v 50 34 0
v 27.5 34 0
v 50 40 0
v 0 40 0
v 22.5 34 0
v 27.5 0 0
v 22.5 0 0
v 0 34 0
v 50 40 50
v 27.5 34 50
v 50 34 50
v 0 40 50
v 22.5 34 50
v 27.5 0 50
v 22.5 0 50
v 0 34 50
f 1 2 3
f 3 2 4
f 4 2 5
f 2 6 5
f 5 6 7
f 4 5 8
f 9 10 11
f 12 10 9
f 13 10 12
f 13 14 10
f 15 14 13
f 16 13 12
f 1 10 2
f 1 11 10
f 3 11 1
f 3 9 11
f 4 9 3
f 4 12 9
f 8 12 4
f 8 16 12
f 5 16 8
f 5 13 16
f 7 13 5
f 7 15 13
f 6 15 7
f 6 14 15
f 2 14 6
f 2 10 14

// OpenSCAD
$fn = 32;

// ----------------------------------------------------------------------
// Structural section: tee 50 x 40 mm
// ----------------------------------------------------------------------

// --- parameters (mm) ---
sec_w = 50;               // tee width, X
sec_h = 40;               // tee height, Y
flange_t = 6;             // top flange thickness
web_t = 5;                // web thickness
plate_t = 50;             // cut length, Z (extrusion height)
fit_tol = 0.02;           // declared fit tolerance (prompt contract)
free_tol = 0.2;           // declared free tolerance (prompt contract)

profile = [[22.5, 0], [27.5, 0], [27.5, 34], [50, 34], [50, 40], [0, 40], [0, 34], [22.5, 34]];  // primary outline, 8 points, counter clockwise

// --- the one profile operation ---
linear_extrude(height = plate_t) polygon(points = profile);
